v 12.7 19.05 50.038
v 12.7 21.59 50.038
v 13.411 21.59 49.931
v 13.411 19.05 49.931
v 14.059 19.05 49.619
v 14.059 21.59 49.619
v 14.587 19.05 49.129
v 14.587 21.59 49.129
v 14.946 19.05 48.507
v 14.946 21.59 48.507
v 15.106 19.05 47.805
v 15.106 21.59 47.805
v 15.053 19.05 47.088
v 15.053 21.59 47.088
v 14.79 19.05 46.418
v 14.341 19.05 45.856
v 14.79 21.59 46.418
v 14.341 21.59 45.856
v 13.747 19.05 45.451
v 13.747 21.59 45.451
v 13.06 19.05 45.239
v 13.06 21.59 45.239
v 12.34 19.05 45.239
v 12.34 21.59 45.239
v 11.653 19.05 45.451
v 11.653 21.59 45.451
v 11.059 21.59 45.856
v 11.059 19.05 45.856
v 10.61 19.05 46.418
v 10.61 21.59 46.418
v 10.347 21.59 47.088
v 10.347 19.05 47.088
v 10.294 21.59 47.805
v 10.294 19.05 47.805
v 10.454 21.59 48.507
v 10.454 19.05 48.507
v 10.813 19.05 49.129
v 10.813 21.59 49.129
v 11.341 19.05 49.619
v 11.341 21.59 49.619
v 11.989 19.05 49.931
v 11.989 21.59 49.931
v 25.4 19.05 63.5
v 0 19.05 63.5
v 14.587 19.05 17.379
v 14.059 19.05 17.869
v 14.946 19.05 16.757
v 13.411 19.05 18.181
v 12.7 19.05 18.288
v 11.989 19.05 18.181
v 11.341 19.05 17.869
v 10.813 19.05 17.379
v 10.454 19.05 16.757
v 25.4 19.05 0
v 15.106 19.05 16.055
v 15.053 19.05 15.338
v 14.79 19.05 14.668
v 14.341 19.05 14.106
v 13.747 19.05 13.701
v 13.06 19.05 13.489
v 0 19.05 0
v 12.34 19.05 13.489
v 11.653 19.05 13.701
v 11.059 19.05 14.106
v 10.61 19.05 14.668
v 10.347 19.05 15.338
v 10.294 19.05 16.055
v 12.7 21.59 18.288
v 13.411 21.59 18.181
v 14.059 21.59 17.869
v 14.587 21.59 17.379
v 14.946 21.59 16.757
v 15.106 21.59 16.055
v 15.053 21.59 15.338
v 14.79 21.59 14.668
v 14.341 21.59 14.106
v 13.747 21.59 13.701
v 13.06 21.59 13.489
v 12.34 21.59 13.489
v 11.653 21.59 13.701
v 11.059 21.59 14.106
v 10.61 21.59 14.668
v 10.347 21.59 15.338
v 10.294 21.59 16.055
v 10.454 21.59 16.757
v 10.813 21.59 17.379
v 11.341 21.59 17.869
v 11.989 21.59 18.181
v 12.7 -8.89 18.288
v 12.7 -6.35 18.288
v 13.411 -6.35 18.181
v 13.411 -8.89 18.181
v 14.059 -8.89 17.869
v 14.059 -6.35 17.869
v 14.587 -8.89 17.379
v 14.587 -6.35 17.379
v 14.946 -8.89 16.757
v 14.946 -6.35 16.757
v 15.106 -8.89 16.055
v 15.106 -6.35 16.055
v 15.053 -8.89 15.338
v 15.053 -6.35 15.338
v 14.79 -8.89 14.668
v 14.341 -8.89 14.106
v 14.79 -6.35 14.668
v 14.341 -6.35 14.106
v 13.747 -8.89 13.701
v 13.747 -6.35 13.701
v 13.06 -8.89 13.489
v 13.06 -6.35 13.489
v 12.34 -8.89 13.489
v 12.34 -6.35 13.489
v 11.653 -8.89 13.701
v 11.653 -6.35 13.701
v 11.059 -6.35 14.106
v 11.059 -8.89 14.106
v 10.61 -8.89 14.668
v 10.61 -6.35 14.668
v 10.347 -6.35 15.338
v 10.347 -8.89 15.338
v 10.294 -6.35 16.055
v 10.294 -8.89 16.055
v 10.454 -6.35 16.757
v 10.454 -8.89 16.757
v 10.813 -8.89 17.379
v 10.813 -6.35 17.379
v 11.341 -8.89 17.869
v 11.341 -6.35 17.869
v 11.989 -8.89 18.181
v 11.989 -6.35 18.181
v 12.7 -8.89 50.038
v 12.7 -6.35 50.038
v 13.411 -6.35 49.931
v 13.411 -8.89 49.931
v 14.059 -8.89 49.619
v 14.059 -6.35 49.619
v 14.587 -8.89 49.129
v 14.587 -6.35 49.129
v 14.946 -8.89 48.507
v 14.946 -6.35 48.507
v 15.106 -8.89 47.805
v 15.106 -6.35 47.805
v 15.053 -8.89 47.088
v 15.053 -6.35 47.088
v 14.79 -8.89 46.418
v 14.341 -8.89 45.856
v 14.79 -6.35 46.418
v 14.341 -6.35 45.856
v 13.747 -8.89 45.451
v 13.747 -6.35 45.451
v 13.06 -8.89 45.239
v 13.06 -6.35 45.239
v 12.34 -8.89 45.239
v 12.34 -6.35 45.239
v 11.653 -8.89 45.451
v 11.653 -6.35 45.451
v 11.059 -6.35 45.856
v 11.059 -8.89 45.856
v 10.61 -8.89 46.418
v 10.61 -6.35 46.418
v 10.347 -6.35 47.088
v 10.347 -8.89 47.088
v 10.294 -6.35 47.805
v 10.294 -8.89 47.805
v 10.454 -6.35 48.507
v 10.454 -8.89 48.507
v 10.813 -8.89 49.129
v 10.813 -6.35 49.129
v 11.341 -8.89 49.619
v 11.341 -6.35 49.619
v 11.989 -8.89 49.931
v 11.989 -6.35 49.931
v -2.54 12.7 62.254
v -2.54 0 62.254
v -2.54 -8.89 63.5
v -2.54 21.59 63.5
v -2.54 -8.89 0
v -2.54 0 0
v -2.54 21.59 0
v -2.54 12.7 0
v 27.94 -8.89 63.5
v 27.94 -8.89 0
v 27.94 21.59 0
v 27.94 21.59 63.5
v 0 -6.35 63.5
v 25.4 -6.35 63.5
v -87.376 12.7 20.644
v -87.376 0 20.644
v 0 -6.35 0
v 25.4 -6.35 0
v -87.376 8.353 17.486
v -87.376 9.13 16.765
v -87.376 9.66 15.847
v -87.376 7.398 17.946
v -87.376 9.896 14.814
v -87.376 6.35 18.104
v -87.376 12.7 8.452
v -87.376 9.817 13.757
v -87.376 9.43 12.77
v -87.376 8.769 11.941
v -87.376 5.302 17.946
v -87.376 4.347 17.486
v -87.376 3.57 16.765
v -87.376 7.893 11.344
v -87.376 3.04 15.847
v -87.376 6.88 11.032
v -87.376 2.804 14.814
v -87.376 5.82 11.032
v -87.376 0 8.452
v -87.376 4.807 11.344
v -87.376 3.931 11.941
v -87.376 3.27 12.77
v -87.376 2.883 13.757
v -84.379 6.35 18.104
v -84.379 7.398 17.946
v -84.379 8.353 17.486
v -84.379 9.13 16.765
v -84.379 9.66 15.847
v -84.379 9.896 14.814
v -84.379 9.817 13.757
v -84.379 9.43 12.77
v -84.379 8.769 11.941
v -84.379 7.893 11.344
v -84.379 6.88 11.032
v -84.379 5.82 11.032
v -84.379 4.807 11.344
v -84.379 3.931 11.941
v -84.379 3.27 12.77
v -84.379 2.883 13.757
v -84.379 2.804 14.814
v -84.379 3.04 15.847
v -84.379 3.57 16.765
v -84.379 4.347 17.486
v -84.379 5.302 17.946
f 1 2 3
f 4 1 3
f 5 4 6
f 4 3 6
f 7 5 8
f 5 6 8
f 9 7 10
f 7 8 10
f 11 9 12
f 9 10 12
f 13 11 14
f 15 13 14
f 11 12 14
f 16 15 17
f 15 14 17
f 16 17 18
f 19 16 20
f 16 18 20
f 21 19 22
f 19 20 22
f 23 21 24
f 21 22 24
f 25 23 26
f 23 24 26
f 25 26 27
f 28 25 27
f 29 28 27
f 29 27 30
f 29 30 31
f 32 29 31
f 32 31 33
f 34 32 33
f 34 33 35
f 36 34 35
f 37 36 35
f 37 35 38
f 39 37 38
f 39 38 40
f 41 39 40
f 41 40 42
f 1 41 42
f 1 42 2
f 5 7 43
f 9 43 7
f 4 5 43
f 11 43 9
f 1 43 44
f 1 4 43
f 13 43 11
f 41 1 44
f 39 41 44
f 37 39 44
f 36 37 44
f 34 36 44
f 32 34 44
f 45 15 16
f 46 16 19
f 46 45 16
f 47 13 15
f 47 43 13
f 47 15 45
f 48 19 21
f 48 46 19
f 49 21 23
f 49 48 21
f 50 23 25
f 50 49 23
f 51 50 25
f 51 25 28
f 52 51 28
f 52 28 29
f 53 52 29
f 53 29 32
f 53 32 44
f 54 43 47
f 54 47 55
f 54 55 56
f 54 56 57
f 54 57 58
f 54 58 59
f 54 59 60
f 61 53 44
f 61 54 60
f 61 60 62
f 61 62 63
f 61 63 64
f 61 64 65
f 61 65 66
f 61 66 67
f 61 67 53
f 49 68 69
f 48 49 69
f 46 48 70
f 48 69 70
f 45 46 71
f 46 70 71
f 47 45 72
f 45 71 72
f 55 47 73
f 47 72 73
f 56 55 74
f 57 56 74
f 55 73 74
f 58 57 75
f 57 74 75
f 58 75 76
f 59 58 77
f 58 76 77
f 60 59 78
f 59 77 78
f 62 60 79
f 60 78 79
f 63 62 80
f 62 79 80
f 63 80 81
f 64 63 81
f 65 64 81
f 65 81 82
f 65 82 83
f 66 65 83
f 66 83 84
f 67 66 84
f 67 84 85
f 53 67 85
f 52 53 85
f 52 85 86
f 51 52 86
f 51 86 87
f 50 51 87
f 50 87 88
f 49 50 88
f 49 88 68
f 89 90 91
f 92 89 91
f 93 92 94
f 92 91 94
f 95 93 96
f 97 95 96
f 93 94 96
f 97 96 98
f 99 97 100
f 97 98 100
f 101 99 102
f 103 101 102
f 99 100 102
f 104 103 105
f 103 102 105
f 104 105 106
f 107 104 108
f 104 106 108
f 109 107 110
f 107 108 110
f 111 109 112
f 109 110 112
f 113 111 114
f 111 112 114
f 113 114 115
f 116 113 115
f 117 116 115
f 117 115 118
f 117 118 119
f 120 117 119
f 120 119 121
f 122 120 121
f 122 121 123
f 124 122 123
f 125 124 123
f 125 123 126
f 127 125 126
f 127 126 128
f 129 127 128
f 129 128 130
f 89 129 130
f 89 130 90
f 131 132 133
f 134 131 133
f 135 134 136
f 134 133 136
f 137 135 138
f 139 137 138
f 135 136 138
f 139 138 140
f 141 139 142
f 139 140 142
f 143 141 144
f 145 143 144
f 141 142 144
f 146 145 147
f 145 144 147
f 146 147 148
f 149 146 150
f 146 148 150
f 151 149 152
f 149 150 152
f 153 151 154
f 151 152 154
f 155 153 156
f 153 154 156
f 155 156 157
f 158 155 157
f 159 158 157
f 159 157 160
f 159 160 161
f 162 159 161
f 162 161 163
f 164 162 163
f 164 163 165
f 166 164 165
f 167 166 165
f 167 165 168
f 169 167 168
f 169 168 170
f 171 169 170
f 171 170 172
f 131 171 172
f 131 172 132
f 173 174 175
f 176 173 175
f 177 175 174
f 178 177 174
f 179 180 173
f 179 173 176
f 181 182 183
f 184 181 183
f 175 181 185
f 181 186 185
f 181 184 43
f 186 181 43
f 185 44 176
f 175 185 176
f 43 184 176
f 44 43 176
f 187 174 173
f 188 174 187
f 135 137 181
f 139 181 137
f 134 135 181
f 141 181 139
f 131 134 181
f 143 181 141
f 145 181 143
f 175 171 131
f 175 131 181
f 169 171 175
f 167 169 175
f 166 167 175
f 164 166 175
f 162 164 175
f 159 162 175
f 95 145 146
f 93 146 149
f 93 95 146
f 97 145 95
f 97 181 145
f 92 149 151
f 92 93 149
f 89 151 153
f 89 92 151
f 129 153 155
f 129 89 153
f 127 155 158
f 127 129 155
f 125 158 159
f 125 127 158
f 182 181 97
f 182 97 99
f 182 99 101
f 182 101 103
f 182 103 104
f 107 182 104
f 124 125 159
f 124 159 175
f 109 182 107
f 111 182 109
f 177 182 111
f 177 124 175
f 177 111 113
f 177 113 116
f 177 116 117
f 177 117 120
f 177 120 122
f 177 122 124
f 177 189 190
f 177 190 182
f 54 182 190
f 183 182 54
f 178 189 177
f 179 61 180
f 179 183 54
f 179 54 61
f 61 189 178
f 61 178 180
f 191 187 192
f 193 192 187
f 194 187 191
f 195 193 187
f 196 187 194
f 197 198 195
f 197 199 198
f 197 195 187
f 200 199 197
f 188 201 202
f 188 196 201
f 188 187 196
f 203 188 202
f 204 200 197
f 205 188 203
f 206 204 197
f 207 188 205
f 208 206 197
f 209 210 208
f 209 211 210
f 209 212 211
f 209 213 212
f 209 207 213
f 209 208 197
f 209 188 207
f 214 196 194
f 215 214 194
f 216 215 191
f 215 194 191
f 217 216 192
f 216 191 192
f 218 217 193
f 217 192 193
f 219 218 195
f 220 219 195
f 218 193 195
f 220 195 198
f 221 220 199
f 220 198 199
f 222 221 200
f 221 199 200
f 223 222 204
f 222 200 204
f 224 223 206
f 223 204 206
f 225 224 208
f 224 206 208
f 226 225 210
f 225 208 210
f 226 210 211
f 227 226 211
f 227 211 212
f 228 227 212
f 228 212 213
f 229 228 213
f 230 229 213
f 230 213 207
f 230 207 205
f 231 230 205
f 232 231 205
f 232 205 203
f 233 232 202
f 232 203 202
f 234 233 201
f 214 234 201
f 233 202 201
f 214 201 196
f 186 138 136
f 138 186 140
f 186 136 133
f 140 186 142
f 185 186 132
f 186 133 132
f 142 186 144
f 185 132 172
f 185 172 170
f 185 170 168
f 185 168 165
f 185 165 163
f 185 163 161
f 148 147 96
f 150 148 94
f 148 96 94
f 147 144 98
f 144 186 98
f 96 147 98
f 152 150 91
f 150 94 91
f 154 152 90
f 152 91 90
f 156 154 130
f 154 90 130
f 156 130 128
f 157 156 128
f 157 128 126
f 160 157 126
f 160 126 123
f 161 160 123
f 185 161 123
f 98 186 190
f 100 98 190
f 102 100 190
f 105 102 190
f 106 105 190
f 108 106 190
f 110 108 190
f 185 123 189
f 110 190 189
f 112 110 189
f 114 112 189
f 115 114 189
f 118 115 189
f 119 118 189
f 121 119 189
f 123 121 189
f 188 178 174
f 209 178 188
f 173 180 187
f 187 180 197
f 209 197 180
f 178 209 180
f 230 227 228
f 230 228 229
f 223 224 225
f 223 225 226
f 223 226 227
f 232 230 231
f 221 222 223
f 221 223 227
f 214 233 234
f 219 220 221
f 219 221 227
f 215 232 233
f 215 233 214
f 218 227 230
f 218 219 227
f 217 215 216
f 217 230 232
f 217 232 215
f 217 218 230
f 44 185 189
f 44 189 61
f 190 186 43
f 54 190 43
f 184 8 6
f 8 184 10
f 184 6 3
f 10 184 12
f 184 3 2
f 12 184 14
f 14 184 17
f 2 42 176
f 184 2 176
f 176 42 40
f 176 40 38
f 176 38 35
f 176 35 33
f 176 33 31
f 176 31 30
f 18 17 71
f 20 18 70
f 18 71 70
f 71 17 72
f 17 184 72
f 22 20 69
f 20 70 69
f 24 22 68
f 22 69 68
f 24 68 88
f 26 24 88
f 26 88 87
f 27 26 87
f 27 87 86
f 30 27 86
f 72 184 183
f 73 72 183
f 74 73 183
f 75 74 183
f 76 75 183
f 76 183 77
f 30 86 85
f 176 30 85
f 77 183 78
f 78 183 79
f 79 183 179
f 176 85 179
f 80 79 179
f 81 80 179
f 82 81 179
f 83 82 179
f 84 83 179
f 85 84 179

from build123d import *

# Parameters (mm, degrees)
BOSS_EXTRUDE1_DEPTH = 12.7
SKETCH2_R           = 3.556
CUT_EXTRUDE1_DEPTH  = 2.9972
SKETCH3_W           = 30.48
SKETCH3_H           = 30.48
SKETCH3_W_2         = 25.4
SKETCH3_H_2         = 25.4
BOSS_EXTRUDE2_DEPTH = 63.5
CUT_EXTRUDE2_REACH  = 114.231
SKETCH4_R           = 2.413
CUT_EXTRUDE3_DEPTH  = 12.7


with BuildPart() as part:
    # Sketch1 → Boss-Extrude1 (new body)
    with BuildSketch(Plane(origin=(0, 0, 0), x_dir=(1, 0, 0), z_dir=(0, 1, 0))):
        Polygon((-87.376, 0), (0, 0), (0, -63.5), (-87.376, -20.644), align=None)
    extrude(amount=BOSS_EXTRUDE1_DEPTH)

    # Sketch2 → Cut-Extrude1 (cut)
    with BuildSketch(Plane.ZY.offset(87.376)):
        with Locations((14.548, 6.35)):
            Circle(SKETCH2_R)
    extrude(amount=-CUT_EXTRUDE1_DEPTH, mode=Mode.SUBTRACT)

    # Sketch3 → Boss-Extrude2 (add)
    with BuildSketch(Plane(origin=(0, 0, 0), x_dir=(-1, 0, 0), z_dir=(0, 0, -1))):
        with Locations((-12.7, 6.35)):
            Rectangle(SKETCH3_W, SKETCH3_H)
        with Locations((-12.7, 6.35)):
            Rectangle(SKETCH3_W_2, SKETCH3_H_2, mode=Mode.SUBTRACT)
    extrude(amount=-BOSS_EXTRUDE2_DEPTH)

    # Cut-Extrude2: up to this face of the body (flat: up to its plane)
    cut_extrude2_end = Plane(part.part.faces().sort_by_distance((12.7, -8.89, 31.75))[0])
    # Sketch4 → Cut-Extrude2 (cut, up to the picked face)
    with BuildSketch(Plane(origin=(0, 21.59, 0), x_dir=(1, 0, 0), z_dir=(0, 1, 0)), mode=Mode.PRIVATE) as cut_extrude2_sk1:
        with Locations(Location((12.7, -15.875, 0), (0, 0, 270))):
            Circle(SKETCH4_R)
    cut_extrude2_tool1 = split(extrude(cut_extrude2_sk1.sketch, amount=-CUT_EXTRUDE2_REACH, mode=Mode.PRIVATE), bisect_by=cut_extrude2_end, keep=Keep.BOTH, mode=Mode.PRIVATE)
    # Sketch4 → Cut-Extrude2 (cut, up to the picked face)
    with BuildSketch(Plane(origin=(0, 21.59, 0), x_dir=(1, 0, 0), z_dir=(0, 1, 0)), mode=Mode.PRIVATE) as cut_extrude2_sk2:
        with Locations(Location((12.7, -47.625, 0), (0, 0, 270))):
            Circle(SKETCH4_R)
    cut_extrude2_tool2 = split(extrude(cut_extrude2_sk2.sketch, amount=-CUT_EXTRUDE2_REACH, mode=Mode.PRIVATE), bisect_by=cut_extrude2_end, keep=Keep.BOTH, mode=Mode.PRIVATE)
    add(cut_extrude2_tool1.solids().sort_by(Axis((12.7, 21.59, 15.875), (0, -1, 0)))[0], mode=Mode.SUBTRACT)
    add(cut_extrude2_tool2.solids().sort_by(Axis((12.7, 21.59, 47.625), (0, -1, 0)))[0], mode=Mode.SUBTRACT)

    # Sketch8 → Cut-Extrude3 (cut)
    with BuildSketch(Plane(origin=(0, 12.7, 0), x_dir=(1, 0, 0), z_dir=(0, 1, 0))):
        Polygon((-87.376, -8.452), (-2.54, 0), (-87.376, 0), align=None)
    extrude(amount=-CUT_EXTRUDE3_DEPTH, mode=Mode.SUBTRACT)


solid = part.part
